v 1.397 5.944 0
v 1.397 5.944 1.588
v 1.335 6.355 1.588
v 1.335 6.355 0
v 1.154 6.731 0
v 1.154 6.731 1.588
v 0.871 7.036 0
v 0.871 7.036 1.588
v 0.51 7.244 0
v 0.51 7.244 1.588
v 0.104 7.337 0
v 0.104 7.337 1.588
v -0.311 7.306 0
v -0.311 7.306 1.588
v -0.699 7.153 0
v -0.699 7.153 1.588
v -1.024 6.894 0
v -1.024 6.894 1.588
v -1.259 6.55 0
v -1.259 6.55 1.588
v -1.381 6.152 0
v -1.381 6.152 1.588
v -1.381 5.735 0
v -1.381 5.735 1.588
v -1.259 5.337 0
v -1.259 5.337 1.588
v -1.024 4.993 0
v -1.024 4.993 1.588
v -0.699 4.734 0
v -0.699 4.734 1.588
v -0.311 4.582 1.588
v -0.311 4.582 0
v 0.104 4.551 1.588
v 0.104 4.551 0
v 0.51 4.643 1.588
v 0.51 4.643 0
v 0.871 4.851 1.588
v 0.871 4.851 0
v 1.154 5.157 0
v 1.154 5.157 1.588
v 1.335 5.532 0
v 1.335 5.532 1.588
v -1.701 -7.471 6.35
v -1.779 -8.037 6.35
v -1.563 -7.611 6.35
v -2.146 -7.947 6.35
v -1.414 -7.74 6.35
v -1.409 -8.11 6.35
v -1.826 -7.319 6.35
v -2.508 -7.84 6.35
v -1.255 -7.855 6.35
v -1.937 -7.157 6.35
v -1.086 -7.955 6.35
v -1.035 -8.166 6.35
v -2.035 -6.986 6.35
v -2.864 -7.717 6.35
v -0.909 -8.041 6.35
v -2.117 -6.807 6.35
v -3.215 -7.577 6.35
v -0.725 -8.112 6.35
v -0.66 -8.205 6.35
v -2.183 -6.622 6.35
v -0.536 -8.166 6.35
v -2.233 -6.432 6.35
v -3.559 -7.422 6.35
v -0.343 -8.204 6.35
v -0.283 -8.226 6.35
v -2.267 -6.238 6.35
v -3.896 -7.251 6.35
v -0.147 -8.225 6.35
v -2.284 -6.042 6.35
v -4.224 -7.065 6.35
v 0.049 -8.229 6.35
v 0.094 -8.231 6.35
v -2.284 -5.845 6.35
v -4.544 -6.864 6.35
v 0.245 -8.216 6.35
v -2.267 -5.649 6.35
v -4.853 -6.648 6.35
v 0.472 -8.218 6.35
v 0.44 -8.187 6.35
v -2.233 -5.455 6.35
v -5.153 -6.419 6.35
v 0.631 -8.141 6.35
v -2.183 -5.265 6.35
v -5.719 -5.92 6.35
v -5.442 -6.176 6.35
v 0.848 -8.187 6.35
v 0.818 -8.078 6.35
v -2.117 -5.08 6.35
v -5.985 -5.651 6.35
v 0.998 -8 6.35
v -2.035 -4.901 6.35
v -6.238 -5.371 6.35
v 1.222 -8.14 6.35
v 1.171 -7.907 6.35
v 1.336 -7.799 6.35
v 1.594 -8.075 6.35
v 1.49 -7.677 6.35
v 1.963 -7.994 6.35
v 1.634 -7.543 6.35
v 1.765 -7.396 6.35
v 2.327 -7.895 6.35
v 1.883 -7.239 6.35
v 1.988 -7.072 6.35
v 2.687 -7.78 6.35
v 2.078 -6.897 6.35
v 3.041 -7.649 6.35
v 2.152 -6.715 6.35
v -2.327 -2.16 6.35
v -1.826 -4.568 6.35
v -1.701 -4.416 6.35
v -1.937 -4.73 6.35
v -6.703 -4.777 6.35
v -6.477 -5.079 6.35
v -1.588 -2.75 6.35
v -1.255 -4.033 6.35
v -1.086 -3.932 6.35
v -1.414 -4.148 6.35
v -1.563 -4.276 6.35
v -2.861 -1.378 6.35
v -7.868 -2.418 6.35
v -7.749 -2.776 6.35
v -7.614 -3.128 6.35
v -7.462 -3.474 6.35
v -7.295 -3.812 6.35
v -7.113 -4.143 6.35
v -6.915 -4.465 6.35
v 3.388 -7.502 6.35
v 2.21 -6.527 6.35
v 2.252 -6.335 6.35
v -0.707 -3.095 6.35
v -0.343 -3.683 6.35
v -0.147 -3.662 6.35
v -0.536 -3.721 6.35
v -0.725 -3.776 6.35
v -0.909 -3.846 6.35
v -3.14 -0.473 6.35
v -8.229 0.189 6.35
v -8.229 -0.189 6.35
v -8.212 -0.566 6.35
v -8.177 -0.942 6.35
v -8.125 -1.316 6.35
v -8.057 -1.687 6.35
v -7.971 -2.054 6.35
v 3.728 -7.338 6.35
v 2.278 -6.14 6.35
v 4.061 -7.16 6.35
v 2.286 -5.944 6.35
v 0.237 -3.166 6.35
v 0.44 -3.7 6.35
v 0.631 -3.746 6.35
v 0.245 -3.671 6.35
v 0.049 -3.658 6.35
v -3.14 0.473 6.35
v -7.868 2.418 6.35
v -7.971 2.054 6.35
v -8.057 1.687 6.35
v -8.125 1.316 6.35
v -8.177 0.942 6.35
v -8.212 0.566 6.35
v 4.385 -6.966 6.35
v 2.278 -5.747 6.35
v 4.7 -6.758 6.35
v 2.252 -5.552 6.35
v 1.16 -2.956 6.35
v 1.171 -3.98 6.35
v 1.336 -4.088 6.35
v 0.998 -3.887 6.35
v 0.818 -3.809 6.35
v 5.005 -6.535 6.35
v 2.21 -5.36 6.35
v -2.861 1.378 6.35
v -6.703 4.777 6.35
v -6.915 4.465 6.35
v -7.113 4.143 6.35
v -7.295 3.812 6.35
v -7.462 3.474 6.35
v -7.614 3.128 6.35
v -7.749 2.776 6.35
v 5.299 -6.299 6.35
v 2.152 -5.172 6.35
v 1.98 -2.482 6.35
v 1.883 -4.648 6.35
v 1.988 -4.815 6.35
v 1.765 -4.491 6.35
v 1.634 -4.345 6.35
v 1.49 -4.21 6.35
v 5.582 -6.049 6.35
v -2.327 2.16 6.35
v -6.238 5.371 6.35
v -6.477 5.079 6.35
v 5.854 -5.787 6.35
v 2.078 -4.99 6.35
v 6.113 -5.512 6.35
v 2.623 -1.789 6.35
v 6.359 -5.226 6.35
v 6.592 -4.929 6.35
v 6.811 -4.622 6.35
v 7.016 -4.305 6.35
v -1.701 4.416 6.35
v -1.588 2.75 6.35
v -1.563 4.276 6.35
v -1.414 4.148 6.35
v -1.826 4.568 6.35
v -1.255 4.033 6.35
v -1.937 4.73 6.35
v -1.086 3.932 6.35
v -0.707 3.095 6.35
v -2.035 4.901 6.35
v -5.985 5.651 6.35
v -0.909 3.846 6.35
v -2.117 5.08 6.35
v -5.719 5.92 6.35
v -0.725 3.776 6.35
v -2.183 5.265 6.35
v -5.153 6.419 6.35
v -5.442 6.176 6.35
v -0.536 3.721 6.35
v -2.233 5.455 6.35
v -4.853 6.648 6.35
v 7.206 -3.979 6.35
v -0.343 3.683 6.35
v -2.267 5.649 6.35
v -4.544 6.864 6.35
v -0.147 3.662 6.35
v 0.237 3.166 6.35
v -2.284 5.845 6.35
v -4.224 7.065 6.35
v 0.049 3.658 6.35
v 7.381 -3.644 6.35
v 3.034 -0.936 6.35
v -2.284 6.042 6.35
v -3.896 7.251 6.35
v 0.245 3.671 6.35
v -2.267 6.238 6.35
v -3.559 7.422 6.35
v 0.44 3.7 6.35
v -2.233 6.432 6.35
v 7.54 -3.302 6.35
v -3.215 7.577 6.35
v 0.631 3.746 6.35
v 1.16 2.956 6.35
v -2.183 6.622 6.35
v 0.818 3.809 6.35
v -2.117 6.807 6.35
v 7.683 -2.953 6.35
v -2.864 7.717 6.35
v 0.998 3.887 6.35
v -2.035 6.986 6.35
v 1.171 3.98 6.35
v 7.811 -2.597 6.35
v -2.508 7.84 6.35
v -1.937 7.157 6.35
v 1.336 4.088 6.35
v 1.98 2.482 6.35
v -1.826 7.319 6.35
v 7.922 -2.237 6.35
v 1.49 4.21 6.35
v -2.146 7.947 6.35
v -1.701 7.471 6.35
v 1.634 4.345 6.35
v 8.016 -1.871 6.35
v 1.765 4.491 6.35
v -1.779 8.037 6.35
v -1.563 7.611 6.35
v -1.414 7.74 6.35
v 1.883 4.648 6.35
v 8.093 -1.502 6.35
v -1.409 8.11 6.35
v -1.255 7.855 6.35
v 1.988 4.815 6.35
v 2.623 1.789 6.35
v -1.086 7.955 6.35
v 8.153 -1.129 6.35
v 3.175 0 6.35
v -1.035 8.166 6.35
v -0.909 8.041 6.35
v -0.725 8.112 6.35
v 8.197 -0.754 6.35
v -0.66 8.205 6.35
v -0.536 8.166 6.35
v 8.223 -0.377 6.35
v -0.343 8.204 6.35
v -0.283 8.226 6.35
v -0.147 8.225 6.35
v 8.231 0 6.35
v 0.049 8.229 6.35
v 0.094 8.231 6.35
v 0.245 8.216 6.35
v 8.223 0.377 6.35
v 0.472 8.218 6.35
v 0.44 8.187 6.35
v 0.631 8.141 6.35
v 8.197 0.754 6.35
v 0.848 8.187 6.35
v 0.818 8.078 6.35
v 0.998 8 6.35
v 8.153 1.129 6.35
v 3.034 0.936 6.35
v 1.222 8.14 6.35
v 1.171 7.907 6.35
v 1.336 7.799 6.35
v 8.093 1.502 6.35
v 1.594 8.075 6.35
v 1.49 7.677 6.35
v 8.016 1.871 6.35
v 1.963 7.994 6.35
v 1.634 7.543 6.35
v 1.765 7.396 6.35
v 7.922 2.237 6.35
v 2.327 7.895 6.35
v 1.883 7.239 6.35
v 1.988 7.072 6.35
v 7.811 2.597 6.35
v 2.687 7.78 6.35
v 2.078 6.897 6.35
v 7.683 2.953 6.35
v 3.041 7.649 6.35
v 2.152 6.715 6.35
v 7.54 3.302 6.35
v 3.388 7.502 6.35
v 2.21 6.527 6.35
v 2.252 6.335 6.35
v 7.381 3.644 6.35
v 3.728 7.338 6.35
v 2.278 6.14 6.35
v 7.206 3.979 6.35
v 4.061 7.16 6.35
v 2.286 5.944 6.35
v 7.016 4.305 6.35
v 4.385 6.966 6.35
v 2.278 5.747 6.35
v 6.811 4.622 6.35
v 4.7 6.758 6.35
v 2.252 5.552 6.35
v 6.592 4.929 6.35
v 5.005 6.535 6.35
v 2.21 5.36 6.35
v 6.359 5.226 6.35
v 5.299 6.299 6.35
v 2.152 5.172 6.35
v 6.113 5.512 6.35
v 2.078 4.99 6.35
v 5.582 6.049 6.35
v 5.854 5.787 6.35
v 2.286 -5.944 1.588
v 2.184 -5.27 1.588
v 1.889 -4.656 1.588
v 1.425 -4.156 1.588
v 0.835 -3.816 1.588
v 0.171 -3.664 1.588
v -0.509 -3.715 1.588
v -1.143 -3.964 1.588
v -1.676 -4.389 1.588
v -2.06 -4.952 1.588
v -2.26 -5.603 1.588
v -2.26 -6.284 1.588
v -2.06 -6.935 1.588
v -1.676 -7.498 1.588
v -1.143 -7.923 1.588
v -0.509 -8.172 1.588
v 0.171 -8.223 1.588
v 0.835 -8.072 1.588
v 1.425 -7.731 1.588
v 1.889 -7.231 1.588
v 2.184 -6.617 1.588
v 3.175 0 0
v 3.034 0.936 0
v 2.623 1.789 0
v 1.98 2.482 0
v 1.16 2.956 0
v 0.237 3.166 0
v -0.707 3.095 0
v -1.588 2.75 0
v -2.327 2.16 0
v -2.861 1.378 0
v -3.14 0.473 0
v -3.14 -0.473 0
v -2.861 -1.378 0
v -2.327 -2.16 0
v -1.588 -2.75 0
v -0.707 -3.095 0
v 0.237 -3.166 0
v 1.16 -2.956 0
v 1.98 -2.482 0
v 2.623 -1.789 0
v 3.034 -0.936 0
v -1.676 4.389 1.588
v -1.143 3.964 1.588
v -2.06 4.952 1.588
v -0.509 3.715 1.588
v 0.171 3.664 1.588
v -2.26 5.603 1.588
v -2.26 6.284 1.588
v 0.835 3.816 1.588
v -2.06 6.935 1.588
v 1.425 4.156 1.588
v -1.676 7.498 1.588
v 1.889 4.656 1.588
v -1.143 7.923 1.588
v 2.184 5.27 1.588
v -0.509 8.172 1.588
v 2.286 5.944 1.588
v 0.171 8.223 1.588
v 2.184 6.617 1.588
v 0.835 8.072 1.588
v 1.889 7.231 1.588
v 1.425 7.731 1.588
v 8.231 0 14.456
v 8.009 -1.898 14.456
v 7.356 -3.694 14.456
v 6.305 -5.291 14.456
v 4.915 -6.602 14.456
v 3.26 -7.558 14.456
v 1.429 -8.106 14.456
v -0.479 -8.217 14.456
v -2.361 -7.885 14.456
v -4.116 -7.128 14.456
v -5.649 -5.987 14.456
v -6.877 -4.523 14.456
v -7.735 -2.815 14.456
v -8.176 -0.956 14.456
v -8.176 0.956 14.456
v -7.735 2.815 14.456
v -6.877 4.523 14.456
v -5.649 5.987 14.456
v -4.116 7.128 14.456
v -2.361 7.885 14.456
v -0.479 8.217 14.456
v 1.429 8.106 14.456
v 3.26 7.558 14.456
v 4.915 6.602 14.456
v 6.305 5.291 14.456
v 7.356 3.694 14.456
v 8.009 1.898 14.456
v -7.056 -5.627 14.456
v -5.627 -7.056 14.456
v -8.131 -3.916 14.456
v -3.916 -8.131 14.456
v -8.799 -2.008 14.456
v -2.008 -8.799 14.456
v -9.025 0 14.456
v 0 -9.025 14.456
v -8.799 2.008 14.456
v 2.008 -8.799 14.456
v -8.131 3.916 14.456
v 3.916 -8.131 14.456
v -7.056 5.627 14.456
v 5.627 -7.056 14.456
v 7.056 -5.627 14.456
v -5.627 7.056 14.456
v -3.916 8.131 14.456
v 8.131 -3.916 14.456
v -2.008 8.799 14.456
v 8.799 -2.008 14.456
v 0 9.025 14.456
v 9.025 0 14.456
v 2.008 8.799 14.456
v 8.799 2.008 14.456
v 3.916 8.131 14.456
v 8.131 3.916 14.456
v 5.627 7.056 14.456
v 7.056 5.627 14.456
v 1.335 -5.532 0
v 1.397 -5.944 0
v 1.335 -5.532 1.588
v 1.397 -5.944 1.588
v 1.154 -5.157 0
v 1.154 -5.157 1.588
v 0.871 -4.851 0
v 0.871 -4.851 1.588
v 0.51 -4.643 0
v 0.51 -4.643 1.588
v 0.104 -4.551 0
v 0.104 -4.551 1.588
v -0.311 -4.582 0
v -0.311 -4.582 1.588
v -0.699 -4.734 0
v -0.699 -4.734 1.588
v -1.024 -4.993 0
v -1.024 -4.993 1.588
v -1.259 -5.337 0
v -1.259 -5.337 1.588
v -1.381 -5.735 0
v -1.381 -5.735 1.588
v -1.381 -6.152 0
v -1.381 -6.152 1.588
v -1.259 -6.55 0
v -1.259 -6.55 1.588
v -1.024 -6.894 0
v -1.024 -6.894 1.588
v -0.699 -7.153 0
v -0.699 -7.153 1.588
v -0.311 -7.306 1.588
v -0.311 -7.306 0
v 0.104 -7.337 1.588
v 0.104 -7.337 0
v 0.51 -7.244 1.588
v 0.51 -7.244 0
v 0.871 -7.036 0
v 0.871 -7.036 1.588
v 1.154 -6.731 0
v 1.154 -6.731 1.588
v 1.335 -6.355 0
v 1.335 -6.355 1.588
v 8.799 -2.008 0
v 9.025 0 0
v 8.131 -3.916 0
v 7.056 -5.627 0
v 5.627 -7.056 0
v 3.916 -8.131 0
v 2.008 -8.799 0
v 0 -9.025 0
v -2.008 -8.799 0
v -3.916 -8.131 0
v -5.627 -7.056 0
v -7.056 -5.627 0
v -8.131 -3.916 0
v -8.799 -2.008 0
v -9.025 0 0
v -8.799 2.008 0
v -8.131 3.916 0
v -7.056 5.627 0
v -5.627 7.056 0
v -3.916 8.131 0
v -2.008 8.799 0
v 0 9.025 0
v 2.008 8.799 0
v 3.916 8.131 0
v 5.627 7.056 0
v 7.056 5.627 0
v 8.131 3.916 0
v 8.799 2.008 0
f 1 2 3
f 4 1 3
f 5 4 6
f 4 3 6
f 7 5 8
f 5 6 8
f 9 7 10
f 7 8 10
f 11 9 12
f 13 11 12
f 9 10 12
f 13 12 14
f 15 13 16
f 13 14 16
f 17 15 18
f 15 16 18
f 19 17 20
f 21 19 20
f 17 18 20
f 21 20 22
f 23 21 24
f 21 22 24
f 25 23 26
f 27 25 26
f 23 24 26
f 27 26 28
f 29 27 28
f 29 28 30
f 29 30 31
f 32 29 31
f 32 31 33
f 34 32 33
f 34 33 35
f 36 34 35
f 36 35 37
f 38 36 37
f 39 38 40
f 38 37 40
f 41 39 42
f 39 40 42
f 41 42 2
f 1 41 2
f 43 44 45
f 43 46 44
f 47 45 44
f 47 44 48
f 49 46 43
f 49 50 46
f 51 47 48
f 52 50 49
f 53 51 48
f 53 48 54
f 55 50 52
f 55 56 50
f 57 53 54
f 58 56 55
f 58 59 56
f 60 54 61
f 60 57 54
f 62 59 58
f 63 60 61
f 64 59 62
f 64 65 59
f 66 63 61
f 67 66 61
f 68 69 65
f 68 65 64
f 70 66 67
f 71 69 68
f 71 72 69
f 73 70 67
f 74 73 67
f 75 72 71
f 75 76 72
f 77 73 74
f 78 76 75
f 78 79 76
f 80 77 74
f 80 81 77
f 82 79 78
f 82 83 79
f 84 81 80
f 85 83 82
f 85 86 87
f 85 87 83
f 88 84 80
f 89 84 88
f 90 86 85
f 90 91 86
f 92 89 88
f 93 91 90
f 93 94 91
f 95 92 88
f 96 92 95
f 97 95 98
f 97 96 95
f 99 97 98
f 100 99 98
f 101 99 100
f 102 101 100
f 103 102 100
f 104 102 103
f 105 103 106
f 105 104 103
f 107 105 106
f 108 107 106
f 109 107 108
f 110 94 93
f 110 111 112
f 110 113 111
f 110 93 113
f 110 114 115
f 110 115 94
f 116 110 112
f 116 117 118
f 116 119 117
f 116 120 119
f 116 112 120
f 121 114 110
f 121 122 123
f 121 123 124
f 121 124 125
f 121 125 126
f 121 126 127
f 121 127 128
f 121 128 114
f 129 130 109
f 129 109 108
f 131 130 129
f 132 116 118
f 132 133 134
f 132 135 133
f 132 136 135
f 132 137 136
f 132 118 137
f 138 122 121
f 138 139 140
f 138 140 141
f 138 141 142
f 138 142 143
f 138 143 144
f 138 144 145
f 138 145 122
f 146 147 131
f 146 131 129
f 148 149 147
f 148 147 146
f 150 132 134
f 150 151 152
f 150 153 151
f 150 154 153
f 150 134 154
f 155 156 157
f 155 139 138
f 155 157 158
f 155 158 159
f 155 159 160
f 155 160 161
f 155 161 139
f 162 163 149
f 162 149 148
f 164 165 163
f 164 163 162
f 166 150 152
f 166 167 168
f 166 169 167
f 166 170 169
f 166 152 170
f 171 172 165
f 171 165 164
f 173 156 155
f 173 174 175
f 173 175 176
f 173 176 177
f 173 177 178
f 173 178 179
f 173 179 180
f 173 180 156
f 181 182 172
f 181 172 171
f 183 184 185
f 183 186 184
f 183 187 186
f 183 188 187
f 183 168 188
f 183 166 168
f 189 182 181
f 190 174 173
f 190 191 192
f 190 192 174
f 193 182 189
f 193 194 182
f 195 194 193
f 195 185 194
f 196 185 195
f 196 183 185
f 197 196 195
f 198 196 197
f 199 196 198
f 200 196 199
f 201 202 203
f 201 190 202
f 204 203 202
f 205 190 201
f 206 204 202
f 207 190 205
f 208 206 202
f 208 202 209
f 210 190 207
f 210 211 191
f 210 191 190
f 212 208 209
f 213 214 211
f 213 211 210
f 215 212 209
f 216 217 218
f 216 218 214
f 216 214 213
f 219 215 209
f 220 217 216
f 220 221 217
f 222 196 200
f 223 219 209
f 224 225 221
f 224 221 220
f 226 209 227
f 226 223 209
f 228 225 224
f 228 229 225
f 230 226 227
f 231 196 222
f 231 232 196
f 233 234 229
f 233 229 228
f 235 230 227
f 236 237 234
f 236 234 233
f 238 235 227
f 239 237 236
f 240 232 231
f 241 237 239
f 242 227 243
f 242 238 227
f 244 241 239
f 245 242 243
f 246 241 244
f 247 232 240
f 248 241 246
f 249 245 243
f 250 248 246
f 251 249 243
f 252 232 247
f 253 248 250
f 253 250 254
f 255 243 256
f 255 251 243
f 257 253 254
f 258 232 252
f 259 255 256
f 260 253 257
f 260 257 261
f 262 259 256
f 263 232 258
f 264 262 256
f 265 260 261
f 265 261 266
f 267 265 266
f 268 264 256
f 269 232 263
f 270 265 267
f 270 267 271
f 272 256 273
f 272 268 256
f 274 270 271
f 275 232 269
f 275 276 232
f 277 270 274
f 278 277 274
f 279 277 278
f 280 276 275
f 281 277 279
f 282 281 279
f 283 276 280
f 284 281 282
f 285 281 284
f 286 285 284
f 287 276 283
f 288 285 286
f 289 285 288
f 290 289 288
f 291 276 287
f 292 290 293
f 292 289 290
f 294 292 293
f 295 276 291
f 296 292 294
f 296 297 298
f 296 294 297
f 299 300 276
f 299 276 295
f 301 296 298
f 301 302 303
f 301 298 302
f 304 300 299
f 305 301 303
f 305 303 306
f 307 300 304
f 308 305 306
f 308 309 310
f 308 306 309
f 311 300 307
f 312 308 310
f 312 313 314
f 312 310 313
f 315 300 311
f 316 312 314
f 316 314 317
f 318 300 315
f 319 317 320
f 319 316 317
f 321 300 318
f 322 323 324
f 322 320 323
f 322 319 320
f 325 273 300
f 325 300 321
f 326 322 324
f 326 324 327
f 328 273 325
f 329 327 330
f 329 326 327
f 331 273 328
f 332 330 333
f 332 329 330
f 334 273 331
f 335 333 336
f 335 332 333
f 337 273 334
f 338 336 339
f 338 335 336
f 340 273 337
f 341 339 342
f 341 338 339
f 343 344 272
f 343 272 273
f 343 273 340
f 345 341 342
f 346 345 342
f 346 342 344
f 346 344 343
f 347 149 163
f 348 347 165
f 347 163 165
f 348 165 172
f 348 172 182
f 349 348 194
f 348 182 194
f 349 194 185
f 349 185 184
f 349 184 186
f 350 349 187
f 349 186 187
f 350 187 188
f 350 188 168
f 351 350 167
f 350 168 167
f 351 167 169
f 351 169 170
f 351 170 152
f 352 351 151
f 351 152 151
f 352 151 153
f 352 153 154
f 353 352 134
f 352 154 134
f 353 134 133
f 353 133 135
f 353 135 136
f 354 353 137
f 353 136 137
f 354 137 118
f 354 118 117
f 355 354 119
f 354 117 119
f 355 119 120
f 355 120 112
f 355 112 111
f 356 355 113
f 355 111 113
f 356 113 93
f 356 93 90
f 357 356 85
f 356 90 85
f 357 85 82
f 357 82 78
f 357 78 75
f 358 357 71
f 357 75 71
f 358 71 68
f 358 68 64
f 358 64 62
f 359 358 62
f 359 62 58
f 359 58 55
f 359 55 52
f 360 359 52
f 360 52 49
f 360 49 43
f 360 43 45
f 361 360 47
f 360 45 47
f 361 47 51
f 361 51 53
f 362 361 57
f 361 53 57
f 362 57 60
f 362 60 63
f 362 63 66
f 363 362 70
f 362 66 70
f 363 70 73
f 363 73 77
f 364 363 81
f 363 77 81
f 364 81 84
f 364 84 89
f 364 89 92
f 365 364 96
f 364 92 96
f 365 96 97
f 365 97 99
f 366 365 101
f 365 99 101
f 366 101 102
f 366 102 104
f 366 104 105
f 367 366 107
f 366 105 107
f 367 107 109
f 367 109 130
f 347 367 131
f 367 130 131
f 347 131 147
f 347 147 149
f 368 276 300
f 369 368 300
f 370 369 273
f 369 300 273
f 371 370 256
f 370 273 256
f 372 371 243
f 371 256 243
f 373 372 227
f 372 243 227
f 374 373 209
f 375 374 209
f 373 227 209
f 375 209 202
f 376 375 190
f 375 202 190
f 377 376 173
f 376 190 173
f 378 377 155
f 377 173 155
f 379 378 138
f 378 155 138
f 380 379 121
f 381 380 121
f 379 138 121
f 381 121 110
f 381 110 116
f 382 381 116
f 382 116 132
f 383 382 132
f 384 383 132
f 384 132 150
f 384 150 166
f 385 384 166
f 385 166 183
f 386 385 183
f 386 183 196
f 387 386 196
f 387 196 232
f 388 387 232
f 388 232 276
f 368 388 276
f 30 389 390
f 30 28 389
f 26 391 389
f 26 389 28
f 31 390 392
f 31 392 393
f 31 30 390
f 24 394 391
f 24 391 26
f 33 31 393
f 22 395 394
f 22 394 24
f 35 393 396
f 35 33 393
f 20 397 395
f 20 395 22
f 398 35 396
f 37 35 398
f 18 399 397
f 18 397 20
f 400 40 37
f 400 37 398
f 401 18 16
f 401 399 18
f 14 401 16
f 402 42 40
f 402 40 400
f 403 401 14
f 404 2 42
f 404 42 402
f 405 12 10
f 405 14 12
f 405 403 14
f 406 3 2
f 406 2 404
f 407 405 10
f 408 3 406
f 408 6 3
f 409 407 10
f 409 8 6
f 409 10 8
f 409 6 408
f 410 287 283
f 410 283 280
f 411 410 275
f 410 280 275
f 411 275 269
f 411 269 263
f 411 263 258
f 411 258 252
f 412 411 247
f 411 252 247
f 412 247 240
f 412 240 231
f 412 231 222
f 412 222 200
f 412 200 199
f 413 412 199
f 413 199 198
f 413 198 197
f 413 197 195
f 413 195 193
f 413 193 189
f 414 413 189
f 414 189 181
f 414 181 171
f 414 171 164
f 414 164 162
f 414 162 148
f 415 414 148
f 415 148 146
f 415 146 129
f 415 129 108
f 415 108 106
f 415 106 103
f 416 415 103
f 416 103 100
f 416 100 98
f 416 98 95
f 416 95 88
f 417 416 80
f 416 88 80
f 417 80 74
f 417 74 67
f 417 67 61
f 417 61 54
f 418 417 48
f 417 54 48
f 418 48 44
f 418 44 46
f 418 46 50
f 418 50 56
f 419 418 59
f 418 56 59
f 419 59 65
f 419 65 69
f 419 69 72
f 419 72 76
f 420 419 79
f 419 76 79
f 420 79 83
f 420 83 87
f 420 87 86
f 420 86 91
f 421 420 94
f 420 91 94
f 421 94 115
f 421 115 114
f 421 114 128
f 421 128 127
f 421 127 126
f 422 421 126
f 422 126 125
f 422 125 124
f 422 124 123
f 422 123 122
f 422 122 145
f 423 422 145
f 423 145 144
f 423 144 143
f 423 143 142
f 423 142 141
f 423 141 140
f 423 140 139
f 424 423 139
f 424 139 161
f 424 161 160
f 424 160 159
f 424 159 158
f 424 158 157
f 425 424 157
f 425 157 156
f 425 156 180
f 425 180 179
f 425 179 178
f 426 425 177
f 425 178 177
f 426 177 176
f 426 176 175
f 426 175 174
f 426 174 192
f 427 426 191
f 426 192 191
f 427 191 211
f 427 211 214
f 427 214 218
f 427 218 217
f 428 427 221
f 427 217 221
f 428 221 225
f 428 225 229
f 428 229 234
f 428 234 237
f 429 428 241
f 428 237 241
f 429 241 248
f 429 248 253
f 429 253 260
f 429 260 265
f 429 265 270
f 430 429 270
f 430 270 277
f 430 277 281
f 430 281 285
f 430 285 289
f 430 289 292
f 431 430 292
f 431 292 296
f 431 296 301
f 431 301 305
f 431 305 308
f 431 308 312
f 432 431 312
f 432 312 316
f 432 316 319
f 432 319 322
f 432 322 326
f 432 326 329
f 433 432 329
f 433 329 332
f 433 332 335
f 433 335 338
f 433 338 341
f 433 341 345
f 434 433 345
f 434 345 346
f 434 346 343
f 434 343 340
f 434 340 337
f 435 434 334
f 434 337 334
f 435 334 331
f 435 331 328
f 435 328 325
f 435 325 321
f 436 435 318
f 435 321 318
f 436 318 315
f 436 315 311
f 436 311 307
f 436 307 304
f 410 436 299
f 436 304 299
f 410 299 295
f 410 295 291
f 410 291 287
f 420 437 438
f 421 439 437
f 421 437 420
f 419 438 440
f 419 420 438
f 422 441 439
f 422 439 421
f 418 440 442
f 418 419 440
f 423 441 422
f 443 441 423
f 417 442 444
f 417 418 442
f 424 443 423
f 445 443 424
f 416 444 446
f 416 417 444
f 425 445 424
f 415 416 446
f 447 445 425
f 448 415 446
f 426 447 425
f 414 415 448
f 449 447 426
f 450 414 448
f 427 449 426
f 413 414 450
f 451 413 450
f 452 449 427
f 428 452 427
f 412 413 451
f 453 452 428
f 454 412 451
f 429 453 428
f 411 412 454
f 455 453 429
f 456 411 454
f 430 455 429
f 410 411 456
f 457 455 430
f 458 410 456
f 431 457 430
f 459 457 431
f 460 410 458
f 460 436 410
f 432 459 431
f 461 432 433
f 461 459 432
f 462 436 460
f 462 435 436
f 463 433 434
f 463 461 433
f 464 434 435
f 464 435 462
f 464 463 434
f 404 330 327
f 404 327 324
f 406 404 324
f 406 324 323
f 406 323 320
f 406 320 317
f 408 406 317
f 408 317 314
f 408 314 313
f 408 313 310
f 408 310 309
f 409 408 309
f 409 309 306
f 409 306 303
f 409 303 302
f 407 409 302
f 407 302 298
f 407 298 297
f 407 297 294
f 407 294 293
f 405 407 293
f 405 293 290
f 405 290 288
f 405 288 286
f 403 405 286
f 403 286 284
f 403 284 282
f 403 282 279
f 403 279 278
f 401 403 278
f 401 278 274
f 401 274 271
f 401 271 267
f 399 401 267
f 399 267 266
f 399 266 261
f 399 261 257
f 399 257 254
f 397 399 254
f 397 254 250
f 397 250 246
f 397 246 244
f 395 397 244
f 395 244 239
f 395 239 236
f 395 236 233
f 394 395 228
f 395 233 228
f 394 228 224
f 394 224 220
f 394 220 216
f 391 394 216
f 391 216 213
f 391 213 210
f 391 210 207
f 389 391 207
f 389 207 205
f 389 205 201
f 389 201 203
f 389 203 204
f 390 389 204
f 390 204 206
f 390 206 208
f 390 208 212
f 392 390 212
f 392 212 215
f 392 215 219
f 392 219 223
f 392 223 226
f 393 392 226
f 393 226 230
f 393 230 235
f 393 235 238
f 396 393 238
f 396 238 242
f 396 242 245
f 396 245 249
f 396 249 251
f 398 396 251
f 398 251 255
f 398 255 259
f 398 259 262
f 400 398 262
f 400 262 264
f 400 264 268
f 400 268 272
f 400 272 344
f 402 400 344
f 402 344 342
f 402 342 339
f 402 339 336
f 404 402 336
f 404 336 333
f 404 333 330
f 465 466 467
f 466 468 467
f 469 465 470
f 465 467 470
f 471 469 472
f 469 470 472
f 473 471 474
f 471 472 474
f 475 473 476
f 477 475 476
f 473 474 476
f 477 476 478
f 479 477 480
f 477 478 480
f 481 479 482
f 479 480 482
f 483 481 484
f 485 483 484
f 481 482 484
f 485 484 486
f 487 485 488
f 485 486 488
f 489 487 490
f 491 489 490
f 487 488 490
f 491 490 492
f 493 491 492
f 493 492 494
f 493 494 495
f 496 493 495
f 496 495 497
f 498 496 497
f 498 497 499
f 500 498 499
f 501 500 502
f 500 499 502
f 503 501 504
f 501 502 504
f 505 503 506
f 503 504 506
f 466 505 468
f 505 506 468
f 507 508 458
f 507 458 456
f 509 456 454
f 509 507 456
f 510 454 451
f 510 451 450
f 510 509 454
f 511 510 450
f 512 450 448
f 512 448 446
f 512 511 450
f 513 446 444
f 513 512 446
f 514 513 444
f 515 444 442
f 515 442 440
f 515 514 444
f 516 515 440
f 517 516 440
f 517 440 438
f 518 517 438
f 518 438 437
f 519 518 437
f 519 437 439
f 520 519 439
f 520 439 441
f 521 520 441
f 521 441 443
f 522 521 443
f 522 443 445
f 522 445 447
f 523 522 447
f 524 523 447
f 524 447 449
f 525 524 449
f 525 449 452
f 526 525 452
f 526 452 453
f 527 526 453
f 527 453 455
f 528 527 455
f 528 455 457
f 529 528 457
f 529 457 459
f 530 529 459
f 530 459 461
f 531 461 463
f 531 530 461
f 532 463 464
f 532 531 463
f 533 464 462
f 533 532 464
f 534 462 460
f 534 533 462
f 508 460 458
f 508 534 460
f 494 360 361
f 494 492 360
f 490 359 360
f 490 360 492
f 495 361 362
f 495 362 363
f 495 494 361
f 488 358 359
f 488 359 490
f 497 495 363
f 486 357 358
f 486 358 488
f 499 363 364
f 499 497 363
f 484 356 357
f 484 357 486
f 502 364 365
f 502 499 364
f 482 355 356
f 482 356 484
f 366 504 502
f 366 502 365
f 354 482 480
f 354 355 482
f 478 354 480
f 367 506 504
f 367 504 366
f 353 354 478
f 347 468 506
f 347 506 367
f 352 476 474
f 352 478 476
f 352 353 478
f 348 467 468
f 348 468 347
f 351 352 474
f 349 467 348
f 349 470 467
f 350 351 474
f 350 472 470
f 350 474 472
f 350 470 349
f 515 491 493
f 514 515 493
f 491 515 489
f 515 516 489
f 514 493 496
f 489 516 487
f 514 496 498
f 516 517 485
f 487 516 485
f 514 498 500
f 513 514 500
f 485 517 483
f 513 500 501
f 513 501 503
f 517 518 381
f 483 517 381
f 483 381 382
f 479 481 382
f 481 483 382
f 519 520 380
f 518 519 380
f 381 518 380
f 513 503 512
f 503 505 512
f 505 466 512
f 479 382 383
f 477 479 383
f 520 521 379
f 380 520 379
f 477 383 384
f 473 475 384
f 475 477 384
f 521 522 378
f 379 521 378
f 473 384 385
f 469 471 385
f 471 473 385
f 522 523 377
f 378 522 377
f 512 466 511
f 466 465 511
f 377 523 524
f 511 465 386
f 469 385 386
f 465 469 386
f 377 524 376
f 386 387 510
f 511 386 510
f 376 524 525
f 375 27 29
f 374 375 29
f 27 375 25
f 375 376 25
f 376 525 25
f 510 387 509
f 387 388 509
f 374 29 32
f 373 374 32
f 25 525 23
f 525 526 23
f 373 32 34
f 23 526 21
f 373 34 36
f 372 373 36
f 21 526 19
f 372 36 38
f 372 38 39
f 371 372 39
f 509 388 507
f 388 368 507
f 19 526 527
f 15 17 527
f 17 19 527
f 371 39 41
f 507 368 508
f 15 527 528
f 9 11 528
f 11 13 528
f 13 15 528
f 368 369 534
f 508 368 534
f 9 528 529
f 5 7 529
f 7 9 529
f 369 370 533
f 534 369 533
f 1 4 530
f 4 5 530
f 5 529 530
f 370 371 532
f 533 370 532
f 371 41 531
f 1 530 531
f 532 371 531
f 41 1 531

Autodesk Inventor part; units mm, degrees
ref_plane "YZ Plane" through (0, 0, 0) normal (1, 0, 0) x (0, 1, 0)
ref_plane "XZ Plane" through (0, 0, 0) normal (0, 1, 0) x (-1, 0, 0)
sketch "Sketch1" plane through (0, 0, 0) normal (0, 0, 1) x (1, 0, 0)
  circle A0 centre (0, 0) radius 9.025
  dimension "d0" = 18.05
extrude "Extrusion1" add sketch "Sketch1" along normal blind 6.35
sketch "Sketch4" plane through (0, 0, 6.35) normal (0, 0, 1) x (1, 0, 0)
  circle A0 centre (0, 0) radius 3.175
  dimension "d6" = 6.35
sketch "Sketch6" plane through (0, 0, 6.35) normal (0, 0, 1) x (1, 0, 0)
  circle A0 centre (0, 0) radius 9.025
  circle A1 centre (0, 0) radius 8.2312
  circle A2 centre (0, 0) radius 9.025 projected
  dimension "d11" = 0.7937
ref_plane "Work Plane1" through (-9.0805, -9.0805, 27.1559) normal (0, 0, -1) x (0.0062, 1, 0)
extrude "Extrusion3" add sketch "Sketch6" along normal up to surface (20.8059 mm away)
sketch "Sketch7" plane through (0, 0, 6.35) normal (0, 0, 1) x (1, 0, 0)
  circle A0 centre (0, 5.9436) radius 1.397
  circle A1 centre (0, -5.9436) radius 1.397
  circle A2 centre (0, 0) radius 8.2312 projected
  dimension "d20" = 2.794
  dimension "d21" = 2.794
  dimension "d22" = 5.9436
  dimension "d23" = 5.9436
extrude "Extrusion4" cut sketch "Sketch7" against normal blind 25.4 contours A0 | A1
sketch "Sketch8" plane through (0, 0, 6.35) normal (0, 0, 1) x (1, 0, 0)
  circle A0 centre (0, 5.9436) radius 2.286
  circle A1 centre (0, -5.9436) radius 2.286
  circle A2 centre (0, 5.9436) radius 1.397 projected
  circle A3 centre (0, -5.9436) radius 1.397 projected
  point P0 (0, 0)
  dimension "d16" = 4.572
  dimension "d17" = 4.572
extrude "Extrusion5" cut sketch "Sketch8" against normal blind 4.7625 contours A0 | A1 | A2 | A3
extrude "Extrusion6" cut sketch "Sketch4" against normal blind 25.4
sketch "Sketch9" plane through (0, 0, 27.1559) normal (0, 0, 1) x (1, 0, 0)
  circle A0 centre (27.8867, -20.1987) radius 65.8542
  point P0 (0, 0)
extrude "Extrusion7" cut sketch "Sketch9" against normal blind 12.7
properties part number "Cap Cap no LED"
